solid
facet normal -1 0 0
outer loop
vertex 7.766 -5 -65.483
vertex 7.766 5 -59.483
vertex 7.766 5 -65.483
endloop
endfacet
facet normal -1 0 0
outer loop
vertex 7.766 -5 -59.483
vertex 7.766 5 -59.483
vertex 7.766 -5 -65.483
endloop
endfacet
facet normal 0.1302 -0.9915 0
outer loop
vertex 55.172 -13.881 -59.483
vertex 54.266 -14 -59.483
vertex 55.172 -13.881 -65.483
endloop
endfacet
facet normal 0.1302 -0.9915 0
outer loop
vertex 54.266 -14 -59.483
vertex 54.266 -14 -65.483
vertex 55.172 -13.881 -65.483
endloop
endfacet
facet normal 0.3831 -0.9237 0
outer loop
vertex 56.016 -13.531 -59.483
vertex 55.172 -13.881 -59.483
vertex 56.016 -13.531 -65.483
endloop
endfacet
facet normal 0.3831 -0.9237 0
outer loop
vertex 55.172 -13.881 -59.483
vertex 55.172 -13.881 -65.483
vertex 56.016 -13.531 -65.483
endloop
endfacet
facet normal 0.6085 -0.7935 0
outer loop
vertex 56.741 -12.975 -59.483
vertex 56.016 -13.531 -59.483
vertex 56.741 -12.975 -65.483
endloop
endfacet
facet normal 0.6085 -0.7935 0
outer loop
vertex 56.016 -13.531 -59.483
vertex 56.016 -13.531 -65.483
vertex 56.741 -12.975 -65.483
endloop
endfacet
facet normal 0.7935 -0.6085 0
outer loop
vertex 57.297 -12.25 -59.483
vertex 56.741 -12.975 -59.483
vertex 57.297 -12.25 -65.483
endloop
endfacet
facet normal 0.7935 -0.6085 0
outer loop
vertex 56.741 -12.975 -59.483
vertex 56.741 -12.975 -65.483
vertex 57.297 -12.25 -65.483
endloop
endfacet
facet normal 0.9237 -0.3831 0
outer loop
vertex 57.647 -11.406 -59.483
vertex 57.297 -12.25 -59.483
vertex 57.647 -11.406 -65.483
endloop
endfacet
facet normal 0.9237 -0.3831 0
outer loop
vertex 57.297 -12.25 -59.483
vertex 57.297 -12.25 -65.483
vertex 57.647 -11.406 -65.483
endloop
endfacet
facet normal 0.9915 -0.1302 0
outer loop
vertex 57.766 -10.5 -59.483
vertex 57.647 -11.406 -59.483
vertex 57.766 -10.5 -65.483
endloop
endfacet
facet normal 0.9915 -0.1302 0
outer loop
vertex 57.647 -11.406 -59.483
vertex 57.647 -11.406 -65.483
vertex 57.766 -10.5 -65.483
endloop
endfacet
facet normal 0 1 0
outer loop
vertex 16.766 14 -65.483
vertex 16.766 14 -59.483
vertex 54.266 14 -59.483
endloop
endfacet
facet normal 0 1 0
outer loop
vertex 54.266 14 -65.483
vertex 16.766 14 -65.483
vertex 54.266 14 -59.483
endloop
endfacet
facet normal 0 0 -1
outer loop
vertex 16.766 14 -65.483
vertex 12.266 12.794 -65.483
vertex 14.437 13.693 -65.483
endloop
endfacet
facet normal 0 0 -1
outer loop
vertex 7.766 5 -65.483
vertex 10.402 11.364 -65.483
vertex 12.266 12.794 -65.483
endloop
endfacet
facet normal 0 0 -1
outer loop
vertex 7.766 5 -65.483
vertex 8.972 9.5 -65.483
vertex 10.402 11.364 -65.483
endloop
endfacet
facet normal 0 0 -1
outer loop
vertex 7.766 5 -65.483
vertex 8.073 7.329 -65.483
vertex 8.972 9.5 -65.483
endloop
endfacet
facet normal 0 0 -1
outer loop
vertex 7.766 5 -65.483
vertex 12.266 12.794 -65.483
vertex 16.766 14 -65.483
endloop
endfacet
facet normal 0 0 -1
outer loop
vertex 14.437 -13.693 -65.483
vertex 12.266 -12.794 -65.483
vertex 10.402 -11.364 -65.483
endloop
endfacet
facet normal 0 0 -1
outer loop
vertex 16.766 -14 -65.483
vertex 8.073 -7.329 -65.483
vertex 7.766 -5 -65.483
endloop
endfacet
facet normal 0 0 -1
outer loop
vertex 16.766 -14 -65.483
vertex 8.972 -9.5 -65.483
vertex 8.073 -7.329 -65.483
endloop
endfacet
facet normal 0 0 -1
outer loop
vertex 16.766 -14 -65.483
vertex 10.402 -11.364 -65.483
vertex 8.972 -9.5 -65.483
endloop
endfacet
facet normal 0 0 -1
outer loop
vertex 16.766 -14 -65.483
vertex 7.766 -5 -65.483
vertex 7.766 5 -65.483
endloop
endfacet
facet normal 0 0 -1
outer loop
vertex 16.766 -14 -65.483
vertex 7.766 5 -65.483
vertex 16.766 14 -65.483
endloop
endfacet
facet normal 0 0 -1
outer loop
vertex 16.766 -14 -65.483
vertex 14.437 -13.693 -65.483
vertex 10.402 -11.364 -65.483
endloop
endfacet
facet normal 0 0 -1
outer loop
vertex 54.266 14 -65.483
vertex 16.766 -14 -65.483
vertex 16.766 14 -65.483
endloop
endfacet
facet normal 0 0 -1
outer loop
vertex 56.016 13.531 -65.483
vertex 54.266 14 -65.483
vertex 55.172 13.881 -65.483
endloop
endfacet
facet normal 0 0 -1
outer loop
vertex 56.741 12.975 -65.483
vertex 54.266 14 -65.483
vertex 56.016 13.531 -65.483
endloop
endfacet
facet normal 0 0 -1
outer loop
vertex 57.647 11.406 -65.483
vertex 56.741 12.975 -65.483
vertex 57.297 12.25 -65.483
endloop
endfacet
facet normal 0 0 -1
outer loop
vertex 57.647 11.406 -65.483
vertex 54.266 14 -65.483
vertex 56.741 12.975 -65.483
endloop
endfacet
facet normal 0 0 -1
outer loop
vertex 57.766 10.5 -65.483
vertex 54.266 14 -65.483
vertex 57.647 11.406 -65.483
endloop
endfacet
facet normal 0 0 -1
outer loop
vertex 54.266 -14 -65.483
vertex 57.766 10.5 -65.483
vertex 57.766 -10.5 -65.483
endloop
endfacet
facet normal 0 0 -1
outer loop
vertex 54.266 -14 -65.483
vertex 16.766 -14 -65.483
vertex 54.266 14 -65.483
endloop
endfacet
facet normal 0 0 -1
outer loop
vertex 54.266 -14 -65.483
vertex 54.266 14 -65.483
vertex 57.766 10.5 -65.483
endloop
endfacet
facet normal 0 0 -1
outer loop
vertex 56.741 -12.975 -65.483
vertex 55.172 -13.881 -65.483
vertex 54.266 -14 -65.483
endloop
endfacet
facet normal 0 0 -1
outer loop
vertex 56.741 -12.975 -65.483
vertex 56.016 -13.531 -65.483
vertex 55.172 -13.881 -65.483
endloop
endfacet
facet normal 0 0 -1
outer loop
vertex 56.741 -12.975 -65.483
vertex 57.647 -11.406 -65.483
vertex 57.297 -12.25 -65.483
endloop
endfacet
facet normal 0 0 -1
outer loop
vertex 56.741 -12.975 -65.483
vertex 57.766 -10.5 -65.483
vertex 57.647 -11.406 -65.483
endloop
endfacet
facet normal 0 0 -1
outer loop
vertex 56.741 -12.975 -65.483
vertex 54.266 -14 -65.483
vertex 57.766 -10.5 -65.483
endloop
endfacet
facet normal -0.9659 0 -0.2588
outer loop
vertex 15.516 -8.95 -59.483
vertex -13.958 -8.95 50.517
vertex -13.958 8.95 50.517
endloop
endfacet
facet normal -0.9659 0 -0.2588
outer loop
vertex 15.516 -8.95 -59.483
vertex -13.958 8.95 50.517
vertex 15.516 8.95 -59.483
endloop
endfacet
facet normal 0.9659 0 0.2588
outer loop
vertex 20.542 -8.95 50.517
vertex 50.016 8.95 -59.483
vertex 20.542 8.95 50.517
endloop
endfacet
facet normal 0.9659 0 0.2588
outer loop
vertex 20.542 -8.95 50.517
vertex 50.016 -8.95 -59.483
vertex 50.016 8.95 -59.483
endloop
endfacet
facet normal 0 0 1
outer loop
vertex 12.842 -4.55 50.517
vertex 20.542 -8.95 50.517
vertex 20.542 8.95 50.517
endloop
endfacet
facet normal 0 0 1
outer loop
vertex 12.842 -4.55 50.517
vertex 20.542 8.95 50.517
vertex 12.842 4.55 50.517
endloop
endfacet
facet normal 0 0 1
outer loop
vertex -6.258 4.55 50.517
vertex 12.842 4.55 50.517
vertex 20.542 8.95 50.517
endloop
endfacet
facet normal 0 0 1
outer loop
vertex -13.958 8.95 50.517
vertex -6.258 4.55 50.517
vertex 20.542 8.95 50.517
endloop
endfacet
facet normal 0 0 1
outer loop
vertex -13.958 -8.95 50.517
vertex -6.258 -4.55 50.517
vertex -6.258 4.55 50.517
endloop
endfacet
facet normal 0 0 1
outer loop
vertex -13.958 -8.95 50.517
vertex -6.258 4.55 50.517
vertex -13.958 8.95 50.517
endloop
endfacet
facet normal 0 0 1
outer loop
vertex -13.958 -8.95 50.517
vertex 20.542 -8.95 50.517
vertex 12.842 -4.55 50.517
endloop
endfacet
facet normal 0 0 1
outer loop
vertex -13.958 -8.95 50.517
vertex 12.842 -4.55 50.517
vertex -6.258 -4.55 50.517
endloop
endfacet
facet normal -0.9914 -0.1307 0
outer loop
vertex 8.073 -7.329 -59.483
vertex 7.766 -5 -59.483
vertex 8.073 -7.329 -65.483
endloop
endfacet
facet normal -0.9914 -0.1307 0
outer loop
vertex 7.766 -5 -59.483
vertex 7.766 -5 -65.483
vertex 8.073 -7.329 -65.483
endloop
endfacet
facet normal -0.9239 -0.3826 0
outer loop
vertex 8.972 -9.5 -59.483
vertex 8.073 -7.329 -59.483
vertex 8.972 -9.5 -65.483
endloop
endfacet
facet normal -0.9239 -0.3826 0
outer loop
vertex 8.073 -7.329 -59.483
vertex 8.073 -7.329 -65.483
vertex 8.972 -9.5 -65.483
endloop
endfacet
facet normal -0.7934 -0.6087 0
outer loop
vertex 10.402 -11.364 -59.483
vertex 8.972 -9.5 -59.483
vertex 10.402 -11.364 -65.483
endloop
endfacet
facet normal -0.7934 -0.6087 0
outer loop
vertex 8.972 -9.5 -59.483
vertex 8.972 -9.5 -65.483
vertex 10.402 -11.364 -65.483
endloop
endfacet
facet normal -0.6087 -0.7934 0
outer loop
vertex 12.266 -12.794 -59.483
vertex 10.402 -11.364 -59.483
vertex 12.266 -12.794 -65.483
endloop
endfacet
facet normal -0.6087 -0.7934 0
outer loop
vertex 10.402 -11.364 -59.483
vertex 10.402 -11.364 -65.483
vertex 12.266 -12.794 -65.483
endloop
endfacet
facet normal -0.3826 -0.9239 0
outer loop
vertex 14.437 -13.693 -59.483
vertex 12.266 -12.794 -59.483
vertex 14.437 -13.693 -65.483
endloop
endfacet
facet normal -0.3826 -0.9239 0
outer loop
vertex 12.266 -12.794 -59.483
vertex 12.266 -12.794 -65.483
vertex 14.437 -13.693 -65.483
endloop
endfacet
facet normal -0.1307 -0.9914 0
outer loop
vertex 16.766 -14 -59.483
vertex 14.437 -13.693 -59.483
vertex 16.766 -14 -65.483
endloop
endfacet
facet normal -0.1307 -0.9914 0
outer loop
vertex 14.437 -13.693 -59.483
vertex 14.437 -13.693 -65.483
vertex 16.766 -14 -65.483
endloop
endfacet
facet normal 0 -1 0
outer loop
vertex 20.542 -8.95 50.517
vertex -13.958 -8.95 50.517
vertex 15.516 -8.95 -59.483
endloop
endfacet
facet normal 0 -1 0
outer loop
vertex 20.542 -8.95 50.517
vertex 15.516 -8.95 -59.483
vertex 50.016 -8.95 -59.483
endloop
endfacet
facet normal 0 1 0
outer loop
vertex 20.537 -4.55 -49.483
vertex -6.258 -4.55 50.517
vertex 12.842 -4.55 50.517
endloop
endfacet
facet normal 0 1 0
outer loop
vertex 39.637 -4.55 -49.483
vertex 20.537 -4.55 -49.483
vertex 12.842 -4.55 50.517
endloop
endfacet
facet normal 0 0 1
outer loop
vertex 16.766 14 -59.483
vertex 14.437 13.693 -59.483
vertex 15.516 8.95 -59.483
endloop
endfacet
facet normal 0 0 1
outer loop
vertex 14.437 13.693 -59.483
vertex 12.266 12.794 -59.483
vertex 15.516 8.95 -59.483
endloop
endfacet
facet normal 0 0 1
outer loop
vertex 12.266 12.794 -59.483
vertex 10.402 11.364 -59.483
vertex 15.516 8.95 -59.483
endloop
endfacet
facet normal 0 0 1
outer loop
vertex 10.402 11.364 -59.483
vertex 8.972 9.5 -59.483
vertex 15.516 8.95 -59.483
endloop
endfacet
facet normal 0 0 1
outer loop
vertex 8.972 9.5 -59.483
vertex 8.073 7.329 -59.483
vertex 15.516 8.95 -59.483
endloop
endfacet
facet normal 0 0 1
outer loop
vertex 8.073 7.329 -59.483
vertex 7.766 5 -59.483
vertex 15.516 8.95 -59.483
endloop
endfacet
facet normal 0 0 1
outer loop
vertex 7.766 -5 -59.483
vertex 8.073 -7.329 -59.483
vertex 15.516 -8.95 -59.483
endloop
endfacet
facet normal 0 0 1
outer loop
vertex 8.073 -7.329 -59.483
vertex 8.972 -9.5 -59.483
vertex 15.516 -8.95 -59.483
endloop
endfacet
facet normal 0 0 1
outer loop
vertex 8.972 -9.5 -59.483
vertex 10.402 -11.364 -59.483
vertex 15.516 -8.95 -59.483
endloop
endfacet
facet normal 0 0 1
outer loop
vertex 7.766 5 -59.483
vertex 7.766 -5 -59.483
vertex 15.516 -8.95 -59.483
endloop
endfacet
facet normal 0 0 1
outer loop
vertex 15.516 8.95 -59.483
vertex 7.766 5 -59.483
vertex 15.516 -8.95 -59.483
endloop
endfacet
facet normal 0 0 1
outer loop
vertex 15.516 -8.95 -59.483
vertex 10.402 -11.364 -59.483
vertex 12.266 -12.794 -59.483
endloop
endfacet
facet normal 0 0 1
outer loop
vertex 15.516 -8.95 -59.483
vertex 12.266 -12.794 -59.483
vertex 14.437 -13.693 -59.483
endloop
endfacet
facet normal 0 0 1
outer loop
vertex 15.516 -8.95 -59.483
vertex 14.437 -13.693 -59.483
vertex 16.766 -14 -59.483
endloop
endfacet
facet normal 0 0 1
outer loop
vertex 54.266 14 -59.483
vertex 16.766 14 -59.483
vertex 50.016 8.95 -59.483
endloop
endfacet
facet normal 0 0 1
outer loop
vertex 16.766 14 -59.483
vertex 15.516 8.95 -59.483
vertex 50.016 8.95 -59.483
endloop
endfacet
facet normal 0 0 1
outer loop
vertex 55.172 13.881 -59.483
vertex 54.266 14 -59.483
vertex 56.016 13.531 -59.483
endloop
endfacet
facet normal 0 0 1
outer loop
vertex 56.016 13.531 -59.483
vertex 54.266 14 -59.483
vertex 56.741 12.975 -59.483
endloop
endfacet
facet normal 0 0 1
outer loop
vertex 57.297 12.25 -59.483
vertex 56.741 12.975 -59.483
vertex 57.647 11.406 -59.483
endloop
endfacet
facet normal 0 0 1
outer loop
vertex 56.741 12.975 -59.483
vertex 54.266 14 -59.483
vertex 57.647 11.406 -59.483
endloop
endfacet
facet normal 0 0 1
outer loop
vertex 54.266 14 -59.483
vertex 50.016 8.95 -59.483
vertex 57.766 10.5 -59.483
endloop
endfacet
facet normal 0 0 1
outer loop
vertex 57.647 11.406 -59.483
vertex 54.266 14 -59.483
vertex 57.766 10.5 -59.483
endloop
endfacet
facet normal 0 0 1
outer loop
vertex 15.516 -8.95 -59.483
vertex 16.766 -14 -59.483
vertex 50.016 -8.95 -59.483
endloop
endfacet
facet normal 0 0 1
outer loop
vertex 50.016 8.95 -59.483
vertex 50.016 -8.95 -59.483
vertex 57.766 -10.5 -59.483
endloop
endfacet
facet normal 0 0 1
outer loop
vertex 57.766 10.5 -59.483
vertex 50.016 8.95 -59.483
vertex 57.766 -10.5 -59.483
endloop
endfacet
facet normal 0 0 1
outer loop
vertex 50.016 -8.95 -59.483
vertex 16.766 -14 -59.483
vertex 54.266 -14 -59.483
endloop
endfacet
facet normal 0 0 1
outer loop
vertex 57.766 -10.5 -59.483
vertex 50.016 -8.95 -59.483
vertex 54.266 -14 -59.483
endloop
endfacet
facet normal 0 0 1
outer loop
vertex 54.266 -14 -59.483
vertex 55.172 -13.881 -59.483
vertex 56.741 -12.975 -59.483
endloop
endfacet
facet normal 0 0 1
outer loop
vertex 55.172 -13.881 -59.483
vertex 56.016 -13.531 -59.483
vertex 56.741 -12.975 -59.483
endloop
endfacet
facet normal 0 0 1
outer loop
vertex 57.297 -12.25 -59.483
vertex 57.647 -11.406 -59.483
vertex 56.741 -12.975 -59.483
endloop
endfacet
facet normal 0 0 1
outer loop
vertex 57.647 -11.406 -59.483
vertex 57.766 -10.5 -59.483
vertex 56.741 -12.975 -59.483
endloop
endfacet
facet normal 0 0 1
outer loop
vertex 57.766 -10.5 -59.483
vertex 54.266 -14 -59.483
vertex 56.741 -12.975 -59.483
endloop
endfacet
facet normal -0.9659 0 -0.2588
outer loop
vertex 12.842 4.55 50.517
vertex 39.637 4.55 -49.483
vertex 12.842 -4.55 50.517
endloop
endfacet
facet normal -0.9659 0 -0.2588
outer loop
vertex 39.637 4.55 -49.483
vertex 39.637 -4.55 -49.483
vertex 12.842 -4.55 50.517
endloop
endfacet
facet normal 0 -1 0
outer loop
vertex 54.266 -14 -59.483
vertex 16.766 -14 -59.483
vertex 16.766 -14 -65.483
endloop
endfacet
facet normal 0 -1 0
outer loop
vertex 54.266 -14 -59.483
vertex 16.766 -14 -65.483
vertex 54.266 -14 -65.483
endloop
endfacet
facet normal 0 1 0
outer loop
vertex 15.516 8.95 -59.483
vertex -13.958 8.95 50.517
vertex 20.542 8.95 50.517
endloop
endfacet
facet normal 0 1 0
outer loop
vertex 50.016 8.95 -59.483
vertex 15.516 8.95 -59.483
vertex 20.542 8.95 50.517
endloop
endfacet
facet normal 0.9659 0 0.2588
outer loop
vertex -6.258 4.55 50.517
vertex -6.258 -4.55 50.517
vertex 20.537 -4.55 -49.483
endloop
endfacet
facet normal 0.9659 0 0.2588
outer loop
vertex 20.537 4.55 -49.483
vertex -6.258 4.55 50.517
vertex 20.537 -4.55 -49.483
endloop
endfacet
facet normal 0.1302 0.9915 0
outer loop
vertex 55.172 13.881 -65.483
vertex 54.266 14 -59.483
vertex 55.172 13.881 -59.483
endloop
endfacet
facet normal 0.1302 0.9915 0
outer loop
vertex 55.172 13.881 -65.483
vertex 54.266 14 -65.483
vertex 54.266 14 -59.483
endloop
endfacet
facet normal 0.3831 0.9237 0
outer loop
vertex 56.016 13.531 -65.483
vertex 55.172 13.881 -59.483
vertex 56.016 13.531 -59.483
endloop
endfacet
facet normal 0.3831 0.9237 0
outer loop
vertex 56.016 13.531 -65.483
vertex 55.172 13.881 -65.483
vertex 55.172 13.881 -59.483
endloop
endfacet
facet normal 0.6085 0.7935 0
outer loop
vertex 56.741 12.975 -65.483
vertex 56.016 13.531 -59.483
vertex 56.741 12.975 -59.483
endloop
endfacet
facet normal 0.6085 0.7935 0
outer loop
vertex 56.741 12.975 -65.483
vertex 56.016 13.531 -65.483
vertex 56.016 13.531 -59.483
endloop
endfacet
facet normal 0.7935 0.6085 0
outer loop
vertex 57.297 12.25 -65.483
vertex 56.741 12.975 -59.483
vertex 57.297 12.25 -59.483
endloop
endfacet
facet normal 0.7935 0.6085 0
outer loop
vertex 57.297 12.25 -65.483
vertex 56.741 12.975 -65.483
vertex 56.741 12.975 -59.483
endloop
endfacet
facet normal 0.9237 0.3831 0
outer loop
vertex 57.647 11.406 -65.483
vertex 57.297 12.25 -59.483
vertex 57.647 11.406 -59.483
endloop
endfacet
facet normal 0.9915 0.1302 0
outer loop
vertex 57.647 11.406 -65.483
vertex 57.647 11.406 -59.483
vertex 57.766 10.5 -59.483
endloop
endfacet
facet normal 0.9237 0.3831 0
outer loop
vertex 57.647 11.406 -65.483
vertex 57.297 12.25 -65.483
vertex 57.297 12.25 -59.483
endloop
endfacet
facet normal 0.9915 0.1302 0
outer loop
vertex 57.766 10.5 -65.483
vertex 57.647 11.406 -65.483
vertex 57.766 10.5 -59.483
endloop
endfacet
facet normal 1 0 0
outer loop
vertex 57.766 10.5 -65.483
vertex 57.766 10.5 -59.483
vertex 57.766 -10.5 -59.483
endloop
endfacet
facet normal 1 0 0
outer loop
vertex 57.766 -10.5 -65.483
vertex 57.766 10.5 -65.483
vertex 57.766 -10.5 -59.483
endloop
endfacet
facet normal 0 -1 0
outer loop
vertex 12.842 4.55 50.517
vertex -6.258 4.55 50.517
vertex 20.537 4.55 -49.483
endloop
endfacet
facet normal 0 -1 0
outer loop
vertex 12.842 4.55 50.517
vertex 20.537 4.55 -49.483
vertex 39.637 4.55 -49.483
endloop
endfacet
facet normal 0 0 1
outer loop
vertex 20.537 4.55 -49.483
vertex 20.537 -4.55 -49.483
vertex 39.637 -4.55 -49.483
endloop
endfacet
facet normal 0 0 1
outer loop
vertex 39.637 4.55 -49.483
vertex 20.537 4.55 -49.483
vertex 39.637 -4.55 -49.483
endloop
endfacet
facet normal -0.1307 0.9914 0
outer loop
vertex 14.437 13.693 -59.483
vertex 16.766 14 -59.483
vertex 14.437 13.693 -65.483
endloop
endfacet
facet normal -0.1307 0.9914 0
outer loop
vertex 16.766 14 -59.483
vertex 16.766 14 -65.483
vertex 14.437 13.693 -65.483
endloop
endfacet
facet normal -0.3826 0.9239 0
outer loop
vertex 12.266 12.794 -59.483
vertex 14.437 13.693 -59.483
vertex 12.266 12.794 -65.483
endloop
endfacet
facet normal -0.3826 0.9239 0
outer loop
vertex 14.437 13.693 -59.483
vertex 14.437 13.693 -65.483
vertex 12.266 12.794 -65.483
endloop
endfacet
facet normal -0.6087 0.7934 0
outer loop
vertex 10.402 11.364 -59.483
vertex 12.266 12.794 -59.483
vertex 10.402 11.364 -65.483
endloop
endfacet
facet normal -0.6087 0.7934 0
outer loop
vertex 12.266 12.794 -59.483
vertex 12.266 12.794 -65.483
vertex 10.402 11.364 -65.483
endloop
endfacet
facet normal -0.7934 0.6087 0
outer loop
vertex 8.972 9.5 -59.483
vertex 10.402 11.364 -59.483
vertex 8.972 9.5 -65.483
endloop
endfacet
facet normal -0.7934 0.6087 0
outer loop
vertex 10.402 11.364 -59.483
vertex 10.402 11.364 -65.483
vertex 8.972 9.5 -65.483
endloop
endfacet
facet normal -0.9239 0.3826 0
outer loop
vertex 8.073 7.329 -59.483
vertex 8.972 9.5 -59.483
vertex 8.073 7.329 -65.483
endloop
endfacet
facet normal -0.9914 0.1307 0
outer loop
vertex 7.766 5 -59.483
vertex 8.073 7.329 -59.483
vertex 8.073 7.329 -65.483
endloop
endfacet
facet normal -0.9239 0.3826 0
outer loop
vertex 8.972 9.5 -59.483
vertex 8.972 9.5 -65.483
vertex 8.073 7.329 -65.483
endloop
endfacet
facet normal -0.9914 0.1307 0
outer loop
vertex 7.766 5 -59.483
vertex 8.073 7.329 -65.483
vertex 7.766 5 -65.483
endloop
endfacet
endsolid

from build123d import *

# Parameters (mm, degrees)
F1_DEPTH = 8.95
F2_W     = 50
F2_H     = 28
F2_W_2   = 34.5
F2_H_2   = 17.9
F3_DEPTH = 6
F5_DEPTH = 4.55
F6_R     = 3.5
F7_R     = 9


with BuildPart() as f1:
    # F0 (on Front) → F1 (new body, symmetric)
    with BuildSketch(Plane.XZ):
        Polygon((20.541627, 50.516934), (-13.958373, 50.516934), (15.516038, -59.483066), (50.016038, -59.483066), align=None)
    extrude(amount=F1_DEPTH, both=True)

    # F2 (on face) → F3 (join)
    with BuildSketch(Plane(origin=(0, 0, -59.483066), x_dir=(1, 0, 0), z_dir=(0, 0, -1))):
        with Locations((32.766038, 0)):
            Rectangle(F2_W, F2_H)
        with Locations((32.766038, 0)):
            Rectangle(F2_W_2, F2_H_2, mode=Mode.SUBTRACT)
        with Locations((32.766038, 0)):
            Rectangle(F2_W_2, F2_H_2)
    extrude(amount=F3_DEPTH)

    # F4 (on Front) → F5 (cut, symmetric)
    with BuildSketch(Plane.XZ):
        Polygon((12.841627, 50.516934), (-6.258373, 50.516934), (20.536546, -49.483066), (39.636546, -49.483066), align=None)
    extrude(amount=F5_DEPTH, both=True, mode=Mode.SUBTRACT)

    # F6
    f6_edges = [f1.edges().sort_by_distance(p)[0] for p in [
        (57.766038, -14, -62.483066),
        (57.766038, 14, -62.483066),
    ]]
    fillet(f6_edges, radius=F6_R)

    # F7
    f7_edges = [f1.edges().sort_by_distance(p)[0] for p in [
        (7.766038, -14, -62.483066),
        (7.766038, 14, -62.483066),
    ]]
    fillet(f7_edges, radius=F7_R)


solid = f1.part
